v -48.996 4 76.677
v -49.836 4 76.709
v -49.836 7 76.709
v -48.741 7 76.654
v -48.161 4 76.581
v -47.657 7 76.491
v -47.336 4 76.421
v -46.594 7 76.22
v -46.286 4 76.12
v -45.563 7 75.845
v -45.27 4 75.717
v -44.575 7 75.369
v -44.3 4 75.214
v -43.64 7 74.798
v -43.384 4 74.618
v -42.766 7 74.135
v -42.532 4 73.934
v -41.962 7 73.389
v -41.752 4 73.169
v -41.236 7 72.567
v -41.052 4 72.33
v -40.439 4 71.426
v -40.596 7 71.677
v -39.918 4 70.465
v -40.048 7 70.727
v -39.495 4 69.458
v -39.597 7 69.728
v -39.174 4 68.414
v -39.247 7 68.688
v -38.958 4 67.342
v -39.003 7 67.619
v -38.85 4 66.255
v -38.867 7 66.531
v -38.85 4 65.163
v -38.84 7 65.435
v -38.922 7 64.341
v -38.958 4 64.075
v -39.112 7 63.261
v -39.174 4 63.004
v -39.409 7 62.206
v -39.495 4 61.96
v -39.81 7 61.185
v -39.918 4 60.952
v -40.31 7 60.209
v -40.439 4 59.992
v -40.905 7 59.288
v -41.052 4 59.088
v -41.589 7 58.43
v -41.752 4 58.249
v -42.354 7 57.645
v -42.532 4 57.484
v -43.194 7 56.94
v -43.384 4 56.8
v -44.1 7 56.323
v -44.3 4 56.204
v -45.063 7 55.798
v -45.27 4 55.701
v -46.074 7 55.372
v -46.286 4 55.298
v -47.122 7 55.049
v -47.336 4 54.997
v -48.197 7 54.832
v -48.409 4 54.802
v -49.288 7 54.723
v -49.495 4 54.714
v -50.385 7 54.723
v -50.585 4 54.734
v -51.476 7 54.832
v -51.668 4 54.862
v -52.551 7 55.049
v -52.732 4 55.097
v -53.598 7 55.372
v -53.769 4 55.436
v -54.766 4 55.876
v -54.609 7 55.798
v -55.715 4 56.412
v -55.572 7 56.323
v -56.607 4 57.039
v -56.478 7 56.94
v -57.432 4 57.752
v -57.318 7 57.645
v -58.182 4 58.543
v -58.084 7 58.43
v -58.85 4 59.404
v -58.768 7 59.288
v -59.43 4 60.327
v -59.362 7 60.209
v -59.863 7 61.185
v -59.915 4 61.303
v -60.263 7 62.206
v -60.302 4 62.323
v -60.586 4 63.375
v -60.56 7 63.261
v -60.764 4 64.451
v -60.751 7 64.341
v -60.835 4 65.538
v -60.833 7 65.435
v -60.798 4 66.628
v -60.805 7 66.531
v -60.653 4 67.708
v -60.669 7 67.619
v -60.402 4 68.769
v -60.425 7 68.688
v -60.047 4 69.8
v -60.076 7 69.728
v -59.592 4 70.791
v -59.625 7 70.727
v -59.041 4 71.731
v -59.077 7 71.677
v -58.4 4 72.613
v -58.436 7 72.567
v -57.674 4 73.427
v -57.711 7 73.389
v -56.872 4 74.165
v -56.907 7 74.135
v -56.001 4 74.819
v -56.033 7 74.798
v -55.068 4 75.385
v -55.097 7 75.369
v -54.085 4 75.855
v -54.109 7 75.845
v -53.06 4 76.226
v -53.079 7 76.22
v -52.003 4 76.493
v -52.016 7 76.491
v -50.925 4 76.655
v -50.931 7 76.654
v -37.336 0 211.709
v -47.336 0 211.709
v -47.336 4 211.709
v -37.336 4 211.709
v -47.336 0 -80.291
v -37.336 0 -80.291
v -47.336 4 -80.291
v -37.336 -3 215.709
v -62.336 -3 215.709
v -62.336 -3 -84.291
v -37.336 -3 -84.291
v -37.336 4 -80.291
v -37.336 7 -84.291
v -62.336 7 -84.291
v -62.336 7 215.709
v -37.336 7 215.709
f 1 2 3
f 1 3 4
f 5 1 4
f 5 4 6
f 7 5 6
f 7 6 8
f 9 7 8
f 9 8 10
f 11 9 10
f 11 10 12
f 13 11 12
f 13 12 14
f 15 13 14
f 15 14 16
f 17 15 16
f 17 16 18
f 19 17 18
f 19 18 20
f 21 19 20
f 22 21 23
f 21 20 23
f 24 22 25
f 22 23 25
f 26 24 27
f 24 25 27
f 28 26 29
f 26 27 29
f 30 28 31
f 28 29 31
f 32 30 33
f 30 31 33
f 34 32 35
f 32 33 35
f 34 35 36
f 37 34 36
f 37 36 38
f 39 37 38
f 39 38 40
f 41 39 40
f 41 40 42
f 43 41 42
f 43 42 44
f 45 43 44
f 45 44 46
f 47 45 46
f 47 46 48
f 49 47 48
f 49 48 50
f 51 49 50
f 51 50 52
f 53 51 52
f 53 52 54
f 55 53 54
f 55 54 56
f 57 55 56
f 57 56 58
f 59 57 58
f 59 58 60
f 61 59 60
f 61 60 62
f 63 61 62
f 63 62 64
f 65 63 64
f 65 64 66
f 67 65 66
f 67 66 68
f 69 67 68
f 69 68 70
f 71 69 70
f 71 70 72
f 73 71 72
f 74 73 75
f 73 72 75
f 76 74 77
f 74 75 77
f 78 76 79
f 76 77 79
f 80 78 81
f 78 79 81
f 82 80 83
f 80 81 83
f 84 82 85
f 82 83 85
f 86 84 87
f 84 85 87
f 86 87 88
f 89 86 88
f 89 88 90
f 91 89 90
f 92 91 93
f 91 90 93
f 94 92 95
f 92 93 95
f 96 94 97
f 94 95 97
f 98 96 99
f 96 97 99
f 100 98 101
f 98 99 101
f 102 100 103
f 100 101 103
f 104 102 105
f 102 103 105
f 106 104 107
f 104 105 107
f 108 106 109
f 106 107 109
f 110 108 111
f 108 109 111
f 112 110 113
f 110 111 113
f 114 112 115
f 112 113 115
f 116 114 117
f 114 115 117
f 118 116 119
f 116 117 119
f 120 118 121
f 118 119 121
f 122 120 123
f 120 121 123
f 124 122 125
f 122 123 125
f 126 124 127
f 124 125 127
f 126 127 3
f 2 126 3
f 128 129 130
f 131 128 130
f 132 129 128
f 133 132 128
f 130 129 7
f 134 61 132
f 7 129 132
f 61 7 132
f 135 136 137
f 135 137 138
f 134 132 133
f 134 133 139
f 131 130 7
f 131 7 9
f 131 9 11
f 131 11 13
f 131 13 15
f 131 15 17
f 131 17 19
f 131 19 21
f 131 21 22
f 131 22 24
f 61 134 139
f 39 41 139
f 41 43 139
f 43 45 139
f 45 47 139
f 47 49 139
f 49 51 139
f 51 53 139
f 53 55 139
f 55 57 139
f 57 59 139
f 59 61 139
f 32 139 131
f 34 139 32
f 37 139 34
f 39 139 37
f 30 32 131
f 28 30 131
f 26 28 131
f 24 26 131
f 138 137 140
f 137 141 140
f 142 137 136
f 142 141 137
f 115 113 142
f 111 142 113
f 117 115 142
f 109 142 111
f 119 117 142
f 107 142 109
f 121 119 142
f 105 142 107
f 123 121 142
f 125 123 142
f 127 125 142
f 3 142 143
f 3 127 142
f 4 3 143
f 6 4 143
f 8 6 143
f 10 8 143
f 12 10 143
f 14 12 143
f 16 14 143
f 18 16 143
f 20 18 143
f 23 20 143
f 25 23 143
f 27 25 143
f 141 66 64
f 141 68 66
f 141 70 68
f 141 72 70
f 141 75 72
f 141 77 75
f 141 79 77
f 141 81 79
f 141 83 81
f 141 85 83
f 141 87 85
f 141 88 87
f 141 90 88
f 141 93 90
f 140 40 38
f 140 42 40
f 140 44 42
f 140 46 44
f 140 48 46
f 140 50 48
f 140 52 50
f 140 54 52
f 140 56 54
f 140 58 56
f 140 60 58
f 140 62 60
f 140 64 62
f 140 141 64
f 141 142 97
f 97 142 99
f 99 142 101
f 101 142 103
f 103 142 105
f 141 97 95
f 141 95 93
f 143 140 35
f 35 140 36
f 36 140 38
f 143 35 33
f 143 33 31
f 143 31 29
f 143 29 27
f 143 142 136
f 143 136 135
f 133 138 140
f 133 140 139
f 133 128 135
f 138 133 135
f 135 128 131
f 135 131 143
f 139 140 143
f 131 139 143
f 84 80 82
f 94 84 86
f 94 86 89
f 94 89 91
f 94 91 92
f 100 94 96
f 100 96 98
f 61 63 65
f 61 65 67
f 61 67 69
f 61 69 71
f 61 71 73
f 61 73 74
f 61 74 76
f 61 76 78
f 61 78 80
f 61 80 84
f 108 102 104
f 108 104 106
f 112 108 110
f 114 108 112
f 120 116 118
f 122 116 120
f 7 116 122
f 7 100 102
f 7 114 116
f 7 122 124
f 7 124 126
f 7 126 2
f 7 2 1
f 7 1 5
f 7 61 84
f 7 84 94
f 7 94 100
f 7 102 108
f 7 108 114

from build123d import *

# Parameters (mm, degrees)
SKETCH_1_W          = 15
SKETCH_1_H          = 300
EXTRUDE_1_DEPTH     = 4
SKETCH_2_W          = 4
SKETCH_2_H          = 4
EXTRUDE_2_DEPTH     = 10
SKETCH_3_W          = 25
SKETCH_3_H          = 300
EXTRUDE_3_DEPTH     = 3
SKETCH_4_W          = 25
SKETCH_4_H          = 300
EXTRUDE_4_DEPTH     = 3
SKETCH_5_R          = 11
CUT_EXTRUDE_1_DEPTH = 3


with BuildPart() as part:
    # 草图1 → 凸台-拉伸1 (new body)
    with BuildSketch(Plane(origin=(0, 0, 0), x_dir=(1, 0, 0), z_dir=(0, 1, 0))):
        with Locations((-54.836215811, -65.70889057)):
            Rectangle(SKETCH_1_W, SKETCH_1_H)
    extrude(amount=EXTRUDE_1_DEPTH)

    # 草图2 → 凸台-拉伸2 (add)
    with BuildSketch(Plane(origin=(-47.336215811, 0, 0), x_dir=(0, 0, -1), z_dir=(1, 0, 0))):
        with Locations((-213.70889057, 2)):
            Rectangle(SKETCH_2_W, SKETCH_2_H)
        with Locations((82.29110943, 2)):
            Rectangle(SKETCH_2_W, SKETCH_2_H)
    extrude(amount=EXTRUDE_2_DEPTH)

    # 草图3 → 凸台-拉伸3 (add)
    with BuildSketch(Plane(origin=(0, 4, 0), x_dir=(1, 0, 0), z_dir=(0, 1, 0))):
        with Locations((-49.836215811, -65.70889057)):
            Rectangle(SKETCH_3_W, SKETCH_3_H)
    extrude(amount=EXTRUDE_3_DEPTH)

    # 草图4 → 凸台-拉伸4 (add)
    with BuildSketch(Plane.XZ):
        with Locations((-49.836215811, 65.70889057)):
            Rectangle(SKETCH_4_W, SKETCH_4_H)
    extrude(amount=EXTRUDE_4_DEPTH)

    # 草图5 → 切除-拉伸1 (cut)
    with BuildSketch(Plane(origin=(0, 7, 0), x_dir=(1, 0, 0), z_dir=(0, 1, 0))):
        with Locations(Location((-49.836215811, -65.70889057, 0), (0, 0, 270))):
            Circle(SKETCH_5_R)
    extrude(amount=-CUT_EXTRUDE_1_DEPTH, mode=Mode.SUBTRACT)


solid = part.part
